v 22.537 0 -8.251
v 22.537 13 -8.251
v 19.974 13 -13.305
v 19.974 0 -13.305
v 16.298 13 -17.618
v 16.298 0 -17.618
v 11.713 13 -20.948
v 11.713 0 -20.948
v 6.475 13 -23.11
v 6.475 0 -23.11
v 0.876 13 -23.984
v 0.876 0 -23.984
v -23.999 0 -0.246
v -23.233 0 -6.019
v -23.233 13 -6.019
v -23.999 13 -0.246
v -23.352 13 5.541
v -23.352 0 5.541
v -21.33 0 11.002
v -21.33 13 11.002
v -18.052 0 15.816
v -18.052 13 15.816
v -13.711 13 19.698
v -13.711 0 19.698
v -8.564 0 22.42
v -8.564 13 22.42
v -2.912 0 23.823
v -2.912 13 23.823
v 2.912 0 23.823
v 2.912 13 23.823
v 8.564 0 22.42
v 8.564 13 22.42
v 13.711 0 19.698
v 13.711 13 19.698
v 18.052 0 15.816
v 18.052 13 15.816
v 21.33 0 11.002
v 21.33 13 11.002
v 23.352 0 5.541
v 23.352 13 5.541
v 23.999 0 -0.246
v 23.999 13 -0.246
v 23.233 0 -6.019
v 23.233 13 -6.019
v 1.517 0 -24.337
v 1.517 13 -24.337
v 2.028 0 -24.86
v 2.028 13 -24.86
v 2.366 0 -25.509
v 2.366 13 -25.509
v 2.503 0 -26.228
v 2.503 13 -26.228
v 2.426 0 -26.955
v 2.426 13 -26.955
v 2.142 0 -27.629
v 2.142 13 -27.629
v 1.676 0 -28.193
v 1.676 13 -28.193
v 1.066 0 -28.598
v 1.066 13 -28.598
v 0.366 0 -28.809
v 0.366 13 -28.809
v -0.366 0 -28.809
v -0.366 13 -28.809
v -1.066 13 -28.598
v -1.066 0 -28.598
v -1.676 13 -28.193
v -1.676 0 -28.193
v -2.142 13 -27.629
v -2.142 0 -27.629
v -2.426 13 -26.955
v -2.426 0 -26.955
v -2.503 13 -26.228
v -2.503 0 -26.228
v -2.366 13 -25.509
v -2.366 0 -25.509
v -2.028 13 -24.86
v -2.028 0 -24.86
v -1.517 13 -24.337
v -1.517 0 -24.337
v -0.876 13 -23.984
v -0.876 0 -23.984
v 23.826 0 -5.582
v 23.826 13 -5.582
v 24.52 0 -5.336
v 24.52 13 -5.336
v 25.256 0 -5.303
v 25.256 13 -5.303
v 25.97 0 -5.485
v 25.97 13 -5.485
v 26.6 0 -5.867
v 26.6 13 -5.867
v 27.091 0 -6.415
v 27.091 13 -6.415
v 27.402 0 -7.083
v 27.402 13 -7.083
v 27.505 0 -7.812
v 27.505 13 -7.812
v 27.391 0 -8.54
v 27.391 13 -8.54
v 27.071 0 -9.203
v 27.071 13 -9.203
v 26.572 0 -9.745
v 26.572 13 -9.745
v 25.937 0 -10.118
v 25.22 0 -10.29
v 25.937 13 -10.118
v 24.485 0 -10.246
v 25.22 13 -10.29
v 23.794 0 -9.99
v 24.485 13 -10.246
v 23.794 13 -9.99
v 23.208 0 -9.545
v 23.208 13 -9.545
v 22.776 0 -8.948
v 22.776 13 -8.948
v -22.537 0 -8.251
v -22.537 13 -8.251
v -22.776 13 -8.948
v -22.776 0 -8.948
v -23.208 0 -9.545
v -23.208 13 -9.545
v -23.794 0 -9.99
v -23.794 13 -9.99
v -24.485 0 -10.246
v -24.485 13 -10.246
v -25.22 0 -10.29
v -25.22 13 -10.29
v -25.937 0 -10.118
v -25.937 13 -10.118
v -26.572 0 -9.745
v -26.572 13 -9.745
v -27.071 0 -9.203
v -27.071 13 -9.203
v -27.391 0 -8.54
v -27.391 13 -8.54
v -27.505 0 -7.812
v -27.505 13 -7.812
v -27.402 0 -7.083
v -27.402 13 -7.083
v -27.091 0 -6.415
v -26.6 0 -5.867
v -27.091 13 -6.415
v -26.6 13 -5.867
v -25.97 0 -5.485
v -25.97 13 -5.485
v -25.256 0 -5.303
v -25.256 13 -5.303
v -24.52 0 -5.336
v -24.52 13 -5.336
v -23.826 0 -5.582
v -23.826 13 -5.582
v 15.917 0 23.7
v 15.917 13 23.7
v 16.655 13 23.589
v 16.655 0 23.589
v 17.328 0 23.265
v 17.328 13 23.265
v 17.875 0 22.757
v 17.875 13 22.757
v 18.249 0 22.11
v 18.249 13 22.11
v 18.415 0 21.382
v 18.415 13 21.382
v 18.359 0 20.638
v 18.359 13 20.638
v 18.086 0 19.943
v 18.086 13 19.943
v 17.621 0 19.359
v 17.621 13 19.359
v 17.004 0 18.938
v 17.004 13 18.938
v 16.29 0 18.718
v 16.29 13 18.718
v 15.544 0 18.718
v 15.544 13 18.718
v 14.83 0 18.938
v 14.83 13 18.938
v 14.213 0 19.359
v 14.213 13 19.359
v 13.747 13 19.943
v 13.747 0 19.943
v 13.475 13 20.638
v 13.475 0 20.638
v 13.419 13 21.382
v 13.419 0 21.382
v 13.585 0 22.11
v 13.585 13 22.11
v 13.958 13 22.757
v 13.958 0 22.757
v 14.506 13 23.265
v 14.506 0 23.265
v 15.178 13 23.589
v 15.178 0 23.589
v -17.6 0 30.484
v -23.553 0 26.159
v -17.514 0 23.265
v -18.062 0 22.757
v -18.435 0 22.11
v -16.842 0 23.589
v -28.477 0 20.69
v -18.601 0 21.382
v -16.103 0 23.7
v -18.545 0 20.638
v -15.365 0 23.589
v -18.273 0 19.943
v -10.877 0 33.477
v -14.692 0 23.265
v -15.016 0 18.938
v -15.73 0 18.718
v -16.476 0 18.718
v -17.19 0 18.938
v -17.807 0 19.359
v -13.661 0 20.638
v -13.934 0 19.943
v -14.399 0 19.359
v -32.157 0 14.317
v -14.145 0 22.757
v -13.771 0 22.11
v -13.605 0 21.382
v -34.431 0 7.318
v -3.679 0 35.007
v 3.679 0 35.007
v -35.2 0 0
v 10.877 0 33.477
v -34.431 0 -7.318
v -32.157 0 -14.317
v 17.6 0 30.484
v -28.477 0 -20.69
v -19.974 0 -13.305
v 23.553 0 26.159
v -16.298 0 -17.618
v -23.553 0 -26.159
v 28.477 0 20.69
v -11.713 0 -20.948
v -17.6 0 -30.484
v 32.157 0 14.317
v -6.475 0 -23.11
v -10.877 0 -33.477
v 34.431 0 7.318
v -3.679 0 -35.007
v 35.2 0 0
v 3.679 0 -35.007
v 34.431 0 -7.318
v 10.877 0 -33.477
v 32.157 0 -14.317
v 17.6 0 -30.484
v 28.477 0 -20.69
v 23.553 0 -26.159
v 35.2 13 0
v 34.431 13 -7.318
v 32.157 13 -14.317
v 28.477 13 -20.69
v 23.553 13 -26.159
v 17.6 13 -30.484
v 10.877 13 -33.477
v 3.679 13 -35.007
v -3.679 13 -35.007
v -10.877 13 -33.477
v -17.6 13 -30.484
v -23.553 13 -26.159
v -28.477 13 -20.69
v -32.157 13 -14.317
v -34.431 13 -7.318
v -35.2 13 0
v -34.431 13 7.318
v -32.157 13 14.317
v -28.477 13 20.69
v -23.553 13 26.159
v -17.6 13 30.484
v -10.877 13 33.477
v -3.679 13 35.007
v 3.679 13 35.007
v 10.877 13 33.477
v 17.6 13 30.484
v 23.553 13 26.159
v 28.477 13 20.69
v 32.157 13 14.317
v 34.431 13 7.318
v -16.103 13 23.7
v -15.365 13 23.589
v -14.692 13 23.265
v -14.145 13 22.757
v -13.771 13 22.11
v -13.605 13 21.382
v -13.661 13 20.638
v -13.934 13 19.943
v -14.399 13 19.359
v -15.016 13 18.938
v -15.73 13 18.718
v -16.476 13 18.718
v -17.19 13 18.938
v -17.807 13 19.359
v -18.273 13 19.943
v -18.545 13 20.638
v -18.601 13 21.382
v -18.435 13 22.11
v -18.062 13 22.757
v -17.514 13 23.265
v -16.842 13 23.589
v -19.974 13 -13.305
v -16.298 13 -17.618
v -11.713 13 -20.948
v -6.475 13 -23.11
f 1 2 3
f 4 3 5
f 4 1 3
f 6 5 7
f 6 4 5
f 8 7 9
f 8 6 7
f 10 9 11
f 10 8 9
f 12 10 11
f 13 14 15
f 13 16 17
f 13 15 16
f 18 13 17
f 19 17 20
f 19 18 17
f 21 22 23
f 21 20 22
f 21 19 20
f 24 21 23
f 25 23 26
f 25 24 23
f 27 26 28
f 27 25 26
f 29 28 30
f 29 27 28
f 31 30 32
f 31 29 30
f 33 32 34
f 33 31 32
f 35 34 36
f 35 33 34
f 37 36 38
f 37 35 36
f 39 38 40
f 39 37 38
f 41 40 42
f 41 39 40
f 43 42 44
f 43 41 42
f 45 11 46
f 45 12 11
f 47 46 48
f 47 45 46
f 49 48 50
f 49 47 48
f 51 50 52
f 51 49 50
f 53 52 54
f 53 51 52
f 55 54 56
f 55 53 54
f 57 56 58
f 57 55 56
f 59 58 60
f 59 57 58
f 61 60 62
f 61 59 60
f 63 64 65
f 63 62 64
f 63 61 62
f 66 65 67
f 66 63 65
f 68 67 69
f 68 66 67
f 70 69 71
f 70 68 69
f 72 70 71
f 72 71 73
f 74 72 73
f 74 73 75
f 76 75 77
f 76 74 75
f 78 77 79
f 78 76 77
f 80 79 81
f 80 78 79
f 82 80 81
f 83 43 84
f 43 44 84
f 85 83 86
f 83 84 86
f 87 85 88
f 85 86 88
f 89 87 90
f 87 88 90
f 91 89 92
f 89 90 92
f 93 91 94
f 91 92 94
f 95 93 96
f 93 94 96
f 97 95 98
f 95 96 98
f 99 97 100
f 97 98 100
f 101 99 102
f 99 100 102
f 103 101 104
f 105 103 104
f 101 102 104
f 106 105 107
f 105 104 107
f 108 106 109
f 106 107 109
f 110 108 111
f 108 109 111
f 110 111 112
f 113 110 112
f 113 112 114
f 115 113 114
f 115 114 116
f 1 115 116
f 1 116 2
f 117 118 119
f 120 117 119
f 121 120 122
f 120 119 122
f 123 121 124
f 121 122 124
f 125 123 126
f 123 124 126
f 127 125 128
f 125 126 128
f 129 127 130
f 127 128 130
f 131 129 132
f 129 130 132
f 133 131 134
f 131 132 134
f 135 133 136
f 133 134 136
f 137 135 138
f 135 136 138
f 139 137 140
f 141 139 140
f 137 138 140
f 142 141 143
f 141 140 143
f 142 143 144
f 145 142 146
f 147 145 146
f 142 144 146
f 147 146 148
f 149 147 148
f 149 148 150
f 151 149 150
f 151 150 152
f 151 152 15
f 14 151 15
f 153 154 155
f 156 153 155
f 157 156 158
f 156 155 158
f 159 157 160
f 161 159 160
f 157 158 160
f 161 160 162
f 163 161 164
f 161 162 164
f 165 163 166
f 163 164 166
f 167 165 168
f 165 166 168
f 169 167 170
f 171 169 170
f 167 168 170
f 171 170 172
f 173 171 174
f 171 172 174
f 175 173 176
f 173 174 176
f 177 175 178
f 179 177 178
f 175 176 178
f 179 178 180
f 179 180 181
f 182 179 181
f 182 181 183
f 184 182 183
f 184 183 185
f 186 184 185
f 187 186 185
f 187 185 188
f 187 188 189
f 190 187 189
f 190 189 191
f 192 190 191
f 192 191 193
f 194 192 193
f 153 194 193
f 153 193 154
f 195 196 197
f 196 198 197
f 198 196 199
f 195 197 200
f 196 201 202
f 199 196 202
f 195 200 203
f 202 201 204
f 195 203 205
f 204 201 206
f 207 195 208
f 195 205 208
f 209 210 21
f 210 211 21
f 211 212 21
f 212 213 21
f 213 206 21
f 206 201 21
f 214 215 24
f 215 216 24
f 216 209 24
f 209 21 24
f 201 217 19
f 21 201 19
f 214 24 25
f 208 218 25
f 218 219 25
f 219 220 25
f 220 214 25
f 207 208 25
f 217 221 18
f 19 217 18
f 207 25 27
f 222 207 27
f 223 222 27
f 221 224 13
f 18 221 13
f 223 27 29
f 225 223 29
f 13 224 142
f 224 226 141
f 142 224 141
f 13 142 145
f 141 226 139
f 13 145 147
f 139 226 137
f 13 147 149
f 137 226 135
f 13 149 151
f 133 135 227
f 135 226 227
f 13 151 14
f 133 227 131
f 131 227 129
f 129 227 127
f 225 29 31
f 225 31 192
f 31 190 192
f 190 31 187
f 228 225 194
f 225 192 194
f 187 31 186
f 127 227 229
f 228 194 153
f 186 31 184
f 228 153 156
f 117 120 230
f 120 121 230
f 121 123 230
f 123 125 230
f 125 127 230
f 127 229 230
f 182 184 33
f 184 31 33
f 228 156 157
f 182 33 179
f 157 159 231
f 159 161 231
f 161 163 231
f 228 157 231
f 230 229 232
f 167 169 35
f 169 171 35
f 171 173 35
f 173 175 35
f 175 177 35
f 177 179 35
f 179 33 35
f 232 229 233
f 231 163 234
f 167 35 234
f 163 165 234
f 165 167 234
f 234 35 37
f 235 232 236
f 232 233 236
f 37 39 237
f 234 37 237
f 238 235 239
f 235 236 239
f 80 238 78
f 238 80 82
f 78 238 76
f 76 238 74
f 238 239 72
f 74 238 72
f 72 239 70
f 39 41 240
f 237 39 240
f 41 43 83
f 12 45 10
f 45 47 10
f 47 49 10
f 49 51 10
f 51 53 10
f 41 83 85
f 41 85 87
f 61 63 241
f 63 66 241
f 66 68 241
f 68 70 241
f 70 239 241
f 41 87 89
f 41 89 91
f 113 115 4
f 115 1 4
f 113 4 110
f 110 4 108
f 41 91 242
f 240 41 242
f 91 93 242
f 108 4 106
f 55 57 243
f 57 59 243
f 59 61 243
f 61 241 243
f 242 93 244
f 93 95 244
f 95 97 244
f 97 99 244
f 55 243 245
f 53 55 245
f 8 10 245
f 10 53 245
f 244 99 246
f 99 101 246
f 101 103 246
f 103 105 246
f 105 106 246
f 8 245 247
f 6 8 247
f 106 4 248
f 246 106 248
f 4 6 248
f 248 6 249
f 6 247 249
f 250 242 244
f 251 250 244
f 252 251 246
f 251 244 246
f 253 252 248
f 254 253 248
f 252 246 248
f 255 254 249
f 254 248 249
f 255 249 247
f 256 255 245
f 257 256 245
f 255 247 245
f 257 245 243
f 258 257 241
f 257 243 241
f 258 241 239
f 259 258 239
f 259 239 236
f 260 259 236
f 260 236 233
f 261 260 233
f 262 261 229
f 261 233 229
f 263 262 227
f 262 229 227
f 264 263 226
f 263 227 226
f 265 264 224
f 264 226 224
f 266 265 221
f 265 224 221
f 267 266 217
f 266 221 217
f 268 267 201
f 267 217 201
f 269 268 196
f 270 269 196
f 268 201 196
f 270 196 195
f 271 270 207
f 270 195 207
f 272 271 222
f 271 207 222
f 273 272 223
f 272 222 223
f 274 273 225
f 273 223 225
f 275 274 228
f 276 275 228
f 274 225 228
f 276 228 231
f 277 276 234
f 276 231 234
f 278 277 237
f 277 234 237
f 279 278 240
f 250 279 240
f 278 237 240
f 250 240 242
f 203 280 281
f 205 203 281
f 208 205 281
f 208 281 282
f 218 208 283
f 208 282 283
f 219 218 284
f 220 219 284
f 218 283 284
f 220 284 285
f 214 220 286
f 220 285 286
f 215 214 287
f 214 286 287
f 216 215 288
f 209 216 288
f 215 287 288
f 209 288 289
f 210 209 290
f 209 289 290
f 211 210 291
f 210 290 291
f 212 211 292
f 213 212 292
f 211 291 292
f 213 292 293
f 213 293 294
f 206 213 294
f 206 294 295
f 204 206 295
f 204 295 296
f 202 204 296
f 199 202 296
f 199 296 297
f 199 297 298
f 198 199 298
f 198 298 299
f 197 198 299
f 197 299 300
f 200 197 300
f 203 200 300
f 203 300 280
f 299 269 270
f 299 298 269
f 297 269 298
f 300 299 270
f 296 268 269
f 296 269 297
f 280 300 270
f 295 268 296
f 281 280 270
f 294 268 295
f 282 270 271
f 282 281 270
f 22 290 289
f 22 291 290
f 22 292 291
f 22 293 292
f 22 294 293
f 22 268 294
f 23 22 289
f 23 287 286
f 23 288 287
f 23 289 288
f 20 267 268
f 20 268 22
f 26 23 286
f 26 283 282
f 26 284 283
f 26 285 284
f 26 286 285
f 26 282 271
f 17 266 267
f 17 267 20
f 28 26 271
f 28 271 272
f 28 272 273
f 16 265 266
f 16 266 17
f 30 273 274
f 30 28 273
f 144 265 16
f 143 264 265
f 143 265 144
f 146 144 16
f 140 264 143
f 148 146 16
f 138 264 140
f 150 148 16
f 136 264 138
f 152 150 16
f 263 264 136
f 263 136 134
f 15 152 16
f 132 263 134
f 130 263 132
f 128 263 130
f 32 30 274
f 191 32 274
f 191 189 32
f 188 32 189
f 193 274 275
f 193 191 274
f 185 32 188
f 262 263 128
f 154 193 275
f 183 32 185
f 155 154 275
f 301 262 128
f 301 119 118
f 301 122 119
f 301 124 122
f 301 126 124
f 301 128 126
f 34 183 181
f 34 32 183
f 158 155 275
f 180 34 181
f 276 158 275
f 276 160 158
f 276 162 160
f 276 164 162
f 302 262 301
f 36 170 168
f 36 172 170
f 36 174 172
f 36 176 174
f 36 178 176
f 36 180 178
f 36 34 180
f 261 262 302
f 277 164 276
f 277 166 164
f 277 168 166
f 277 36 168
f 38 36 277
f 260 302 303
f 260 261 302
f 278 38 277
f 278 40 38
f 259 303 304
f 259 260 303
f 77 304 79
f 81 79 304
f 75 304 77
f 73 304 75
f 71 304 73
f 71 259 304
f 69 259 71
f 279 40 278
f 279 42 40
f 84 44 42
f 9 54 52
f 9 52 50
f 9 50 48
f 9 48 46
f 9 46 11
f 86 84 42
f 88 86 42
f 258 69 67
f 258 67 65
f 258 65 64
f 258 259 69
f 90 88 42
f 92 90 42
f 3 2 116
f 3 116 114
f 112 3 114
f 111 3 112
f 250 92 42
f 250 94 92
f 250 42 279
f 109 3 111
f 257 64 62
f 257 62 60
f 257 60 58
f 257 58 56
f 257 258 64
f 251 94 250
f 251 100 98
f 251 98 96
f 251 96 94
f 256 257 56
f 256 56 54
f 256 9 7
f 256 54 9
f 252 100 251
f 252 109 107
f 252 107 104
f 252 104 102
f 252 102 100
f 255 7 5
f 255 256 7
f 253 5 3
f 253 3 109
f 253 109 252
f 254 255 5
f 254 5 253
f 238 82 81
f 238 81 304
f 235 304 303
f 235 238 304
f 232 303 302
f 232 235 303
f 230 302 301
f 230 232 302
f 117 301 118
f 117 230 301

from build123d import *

# Parameters (mm, degrees)
SKETCH_1_R          = 35.2
SKETCH_1_R_2        = 24
EXTRUDE_1_DEPTH     = 13
SKETCH_2_R          = 2.505
CUT_EXTRUDE_1_DEPTH = 16
SKETCH_11_R         = 2.505
CUT_EXTRUDE_3_DEPTH = 16
SKETCH_12_R         = 2.505
CUT_EXTRUDE_4_DEPTH = 16


with BuildPart() as part:
    # 草圖1 → 伸長-薄件1 (new body)
    with BuildSketch(Plane(origin=(0, 0, 0), x_dir=(1, 0, 0), z_dir=(0, 1, 0))):
        Circle(SKETCH_1_R)
        Circle(SKETCH_1_R_2, mode=Mode.SUBTRACT)
    extrude(amount=EXTRUDE_1_DEPTH)

    # 草圖2 → 除料-伸長1 (cut)
    with BuildSketch(Plane(origin=(0, 0, 0), x_dir=(1, 0, 0), z_dir=(0, 1, 0))):
        with Locations((0, 26.330818465)):
            Circle(SKETCH_2_R)
    extrude(amount=CUT_EXTRUDE_1_DEPTH, mode=Mode.SUBTRACT)

    # 草圖11 → 除料-伸長3 (cut)
    with BuildSketch(Plane(origin=(0, 13, 0), x_dir=(1, 0, 0), z_dir=(0, 1, 0))):
        with Locations(Location((-16.103145177, -21.195220814, 0), (0, 0, 270))):
            Circle(SKETCH_11_R)
        with Locations(Location((15.916854823, -21.195220814, 0), (0, 0, 270))):
            Circle(SKETCH_11_R)
    extrude(amount=-CUT_EXTRUDE_3_DEPTH, mode=Mode.SUBTRACT)

    # 草圖12 → 除料-伸長4 (cut)
    with BuildSketch(Plane(origin=(0, 13, 0), x_dir=(1, 0, 0), z_dir=(0, 1, 0))):
        with Locations((-24.999999999, 7.794477134)):
            Circle(SKETCH_12_R)
        with Locations((25.000000001, 7.794477134)):
            Circle(SKETCH_12_R)
    extrude(amount=-CUT_EXTRUDE_4_DEPTH, mode=Mode.SUBTRACT)


solid = part.part
